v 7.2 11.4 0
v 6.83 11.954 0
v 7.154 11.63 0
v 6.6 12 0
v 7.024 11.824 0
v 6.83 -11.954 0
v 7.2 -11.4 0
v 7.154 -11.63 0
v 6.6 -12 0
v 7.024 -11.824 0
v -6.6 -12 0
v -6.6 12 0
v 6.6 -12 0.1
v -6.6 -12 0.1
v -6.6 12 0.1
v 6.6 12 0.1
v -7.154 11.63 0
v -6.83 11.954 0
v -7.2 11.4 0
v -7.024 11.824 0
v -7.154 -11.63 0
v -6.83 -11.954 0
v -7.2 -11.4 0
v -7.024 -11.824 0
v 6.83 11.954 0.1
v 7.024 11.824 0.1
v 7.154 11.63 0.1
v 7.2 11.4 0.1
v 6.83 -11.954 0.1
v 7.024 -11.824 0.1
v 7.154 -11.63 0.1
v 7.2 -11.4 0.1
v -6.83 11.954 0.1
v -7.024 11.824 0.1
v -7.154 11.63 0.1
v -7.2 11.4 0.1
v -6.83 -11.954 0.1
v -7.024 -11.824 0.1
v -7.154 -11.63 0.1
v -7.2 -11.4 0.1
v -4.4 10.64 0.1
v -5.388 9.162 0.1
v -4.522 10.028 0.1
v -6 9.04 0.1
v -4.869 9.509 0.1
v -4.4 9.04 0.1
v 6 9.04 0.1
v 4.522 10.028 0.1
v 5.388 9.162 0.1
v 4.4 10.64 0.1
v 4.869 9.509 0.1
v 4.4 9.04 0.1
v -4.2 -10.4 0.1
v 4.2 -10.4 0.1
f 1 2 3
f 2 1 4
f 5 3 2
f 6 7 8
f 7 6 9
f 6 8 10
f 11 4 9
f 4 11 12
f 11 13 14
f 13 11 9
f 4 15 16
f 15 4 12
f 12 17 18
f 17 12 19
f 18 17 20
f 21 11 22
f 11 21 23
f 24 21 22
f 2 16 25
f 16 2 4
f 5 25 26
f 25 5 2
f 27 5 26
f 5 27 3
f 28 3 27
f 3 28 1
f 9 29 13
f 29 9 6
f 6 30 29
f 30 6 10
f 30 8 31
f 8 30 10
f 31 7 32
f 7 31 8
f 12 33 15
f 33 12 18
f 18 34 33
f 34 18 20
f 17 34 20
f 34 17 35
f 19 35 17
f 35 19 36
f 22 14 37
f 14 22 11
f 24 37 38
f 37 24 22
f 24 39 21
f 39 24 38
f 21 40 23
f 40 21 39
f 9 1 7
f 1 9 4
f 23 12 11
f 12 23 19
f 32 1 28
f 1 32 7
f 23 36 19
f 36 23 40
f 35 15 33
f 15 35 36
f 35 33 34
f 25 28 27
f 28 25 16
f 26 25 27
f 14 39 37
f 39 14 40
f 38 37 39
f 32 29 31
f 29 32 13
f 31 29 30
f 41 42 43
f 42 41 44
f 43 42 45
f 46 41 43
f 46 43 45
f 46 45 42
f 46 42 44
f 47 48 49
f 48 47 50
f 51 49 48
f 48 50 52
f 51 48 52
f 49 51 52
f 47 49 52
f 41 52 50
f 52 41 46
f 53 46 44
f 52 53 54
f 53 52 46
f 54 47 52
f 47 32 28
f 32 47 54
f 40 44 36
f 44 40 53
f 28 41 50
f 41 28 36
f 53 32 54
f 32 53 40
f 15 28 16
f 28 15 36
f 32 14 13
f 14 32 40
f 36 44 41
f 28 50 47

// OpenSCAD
// file: ../p/box3u12.scad
use <../lib.scad>
function ldraw_lib__box3u12() = [
// 0 Box with 3 Parallel Faces without Any Edges
// 0 Name: box3u12.dat
// 0 Author: J.C. Tchang [tchang]
// 0 !LDRAW_ORG Primitive UPDATE 2014-02
// 0 !LICENSE Licensed under CC BY 4.0 : see CAreadme.txt
// 
// 0 BFC CERTIFY CCW
  [0,"BFC","CERTIFY"],
  [0,"BFC","CCW"],
// 
// 0 !HISTORY 2014-12-23 [PTadmin] Official Update 2014-02
// 
// 
// 4 16 -1 1 1 1 1 1 1 1 -1 -1 1 -1
  [4,16,-1,1,1,1,1,1,1,1,-1,-1,1,-1],
// 4 16 -1 1 1 -1 0 1 1 0 1 1 1 1
  [4,16,-1,1,1,-1,0,1,1,0,1,1,1,1],
// 4 16 1 1 -1 1 0 -1 -1 0 -1 -1 1 -1
  [4,16,1,1,-1,1,0,-1,-1,0,-1,-1,1,-1],
];
module ldraw_lib__box3u12(step=0, col=false, unit=2/5, alt=false, line=0.2, solid=!$preview)
    makepoly(ldraw_lib__box3u12(), step=step, col=col, unit=unit, alt=alt, line=line, solid=solid);
ldraw_lib__box3u12(line=0.2);
// file: ../p/1-4cyli.scad
use <../lib.scad>
function ldraw_lib__1_4cyli() = [
// 0 Cylinder 0.25
// 0 Name: 1-4cyli.dat
// 0 Author: James Jessiman
// 0 !LDRAW_ORG Primitive UPDATE 2012-01
// 0 !LICENSE Licensed under CC BY 4.0 : see CAreadme.txt
// 
// 0 BFC CERTIFY CCW
  [0,"BFC","CERTIFY"],
  [0,"BFC","CCW"],
// 
// 0 !HISTORY 2002-03-23 [sbliss] Added BFC statement.
// 0 !HISTORY 2002-04-25 [PTadmin] Official Update 2002-02
// 0 !HISTORY 2007-06-22 [PTadmin] Header formatted for Contributor Agreement
// 0 !HISTORY 2008-07-01 [PTadmin] Official Update 2008-01
// 0 !HISTORY 2012-02-16 [Philo] Changed to CCW
// 0 !HISTORY 2012-03-30 [PTadmin] Official Update 2012-01
// 
// 
// 4 16 1 1 0 0.9239 1 0.3827 0.9239 0 0.3827 1 0 0
  [4,16,1,1,0,0.9239,1,0.3827,0.9239,0,0.3827,1,0,0],
// 5 24 1 0 0 1 1 0 0.9239 0 0.3827 1 0 -1
  [5,24,1,0,0,1,1,0,0.9239,0,0.3827,1,0,-1],
// 4 16 0.9239 1 0.3827 0.7071 1 0.7071 0.7071 0 0.7071 0.9239 0 0.3827
  [4,16,0.9239,1,0.3827,0.7071,1,0.7071,0.7071,0,0.7071,0.9239,0,0.3827],
// 5 24 0.9239 0 0.3827 0.9239 1 0.3827 0.7071 0 0.7071 1 0 0
  [5,24,0.9239,0,0.3827,0.9239,1,0.3827,0.7071,0,0.7071,1,0,0],
// 4 16 0.7071 1 0.7071 0.3827 1 0.9239 0.3827 0 0.9239 0.7071 0 0.7071
  [4,16,0.7071,1,0.7071,0.3827,1,0.9239,0.3827,0,0.9239,0.7071,0,0.7071],
// 5 24 0.7071 0 0.7071 0.7071 1 0.7071 0.3827 0 0.9239 0.9239 0 0.3827
  [5,24,0.7071,0,0.7071,0.7071,1,0.7071,0.3827,0,0.9239,0.9239,0,0.3827],
// 4 16 0.3827 1 0.9239 0 1 1 0 0 1 0.3827 0 0.9239
  [4,16,0.3827,1,0.9239,0,1,1,0,0,1,0.3827,0,0.9239],
// 5 24 0.3827 0 0.9239 0.3827 1 0.9239 0 0 1 0.7071 0 0.7071
  [5,24,0.3827,0,0.9239,0.3827,1,0.9239,0,0,1,0.7071,0,0.7071],
// 5 24 0 0 1 0 1 1 0.3827 0 0.9239 -1 0 1
  [5,24,0,0,1,0,1,1,0.3827,0,0.9239,-1,0,1],
];
module ldraw_lib__1_4cyli(step=0, col=false, unit=2/5, alt=false, line=0.2, solid=!$preview)
    makepoly(ldraw_lib__1_4cyli(), step=step, col=col, unit=unit, alt=alt, line=line, solid=solid);
ldraw_lib__1_4cyli(line=0.2);
// file: s/stickerback018x030.scad
use <../../lib.scad>
use <../../p/1-4chrd.scad>
use <../../p/1-4cyli.scad>
use <../../p/box3u12.scad>
function ldraw_lib__s__stickerback018x030() = [
// 0 ~Sticker Back  1.8 x  3.0
// 0 Name: s\stickerback018x030.dat
// 0 Author: Massimo Maso [Sirio]
// 0 !LDRAW_ORG Subpart UPDATE 2026-08
// 0 !LICENSE Licensed under CC BY 4.0 : see CAreadme.txt
// 
// 0 BFC CERTIFY CCW
  [0,"BFC","CERTIFY"],
  [0,"BFC","CCW"],
// 
// 0 !HISTORY 2026-08-31 [OrionP] Official Update 2026-08
// 
// 0 // Primitives
// 1 16 -28.5 0 16.5 -1.5 0 0 0 -1 0 0 0 1.5 1-4chrd.dat
  [1,16,-28.5,0,16.5,-1.5,0,0,0,-1,0,0,0,1.5, ldraw_lib__1_4chrd()],
// 1 16 28.5 0 16.5 1.5 0 0 0 -1 0 0 0 1.5 1-4chrd.dat
  [1,16,28.5,0,16.5,1.5,0,0,0,-1,0,0,0,1.5, ldraw_lib__1_4chrd()],
// 1 16 0 -.25 0 0 0 30 0 .25 0 16.5 0 0 box3u12.dat
  [1,16,0,-.25,0,0,0,30,0,.25,0,16.5,0,0, ldraw_lib__box3u12()],
// 1 16 -28.5 0 -16.5 -1.5 0 0 0 -1 0 0 0 -1.5 1-4chrd.dat
  [1,16,-28.5,0,-16.5,-1.5,0,0,0,-1,0,0,0,-1.5, ldraw_lib__1_4chrd()],
// 1 16 28.5 0 -16.5 1.5 0 0 0 -1 0 0 0 -1.5 1-4chrd.dat
  [1,16,28.5,0,-16.5,1.5,0,0,0,-1,0,0,0,-1.5, ldraw_lib__1_4chrd()],
// 1 16 -28.5 0 16.5 -1.5 0 0 0 -.25 0 0 0 1.5 1-4cyli.dat
  [1,16,-28.5,0,16.5,-1.5,0,0,0,-.25,0,0,0,1.5, ldraw_lib__1_4cyli()],
// 1 16 28.5 0 16.5 1.5 0 0 0 -.25 0 0 0 1.5 1-4cyli.dat
  [1,16,28.5,0,16.5,1.5,0,0,0,-.25,0,0,0,1.5, ldraw_lib__1_4cyli()],
// 1 16 -28.5 0 -16.5 -1.5 0 0 0 -.25 0 0 0 -1.5 1-4cyli.dat
  [1,16,-28.5,0,-16.5,-1.5,0,0,0,-.25,0,0,0,-1.5, ldraw_lib__1_4cyli()],
// 1 16 28.5 0 -16.5 1.5 0 0 0 -.25 0 0 0 -1.5 1-4cyli.dat
  [1,16,28.5,0,-16.5,1.5,0,0,0,-.25,0,0,0,-1.5, ldraw_lib__1_4cyli()],
// 0 // Bottom face
// 4 16 -30 0 16.5 -28.5 0 18 28.5 0 18 30 0 16.5
  [4,16,-30,0,16.5,-28.5,0,18,28.5,0,18,30,0,16.5],
// 4 16 -30 0 -16.5 30 0 -16.5 28.5 0 -18 -28.5 0 -18
  [4,16,-30,0,-16.5,30,0,-16.5,28.5,0,-18,-28.5,0,-18],
// 0 // Lateral face
// 4 16 -28.5 0 18 -28.5 -.25 18 28.5 -.25 18 28.5 0 18
  [4,16,-28.5,0,18,-28.5,-.25,18,28.5,-.25,18,28.5,0,18],
// 4 16 -28.5 0 -18 28.5 0 -18 28.5 -.25 -18 -28.5 -.25 -18
  [4,16,-28.5,0,-18,28.5,0,-18,28.5,-.25,-18,-28.5,-.25,-18],
];
module ldraw_lib__s__stickerback018x030(step=0, col=false, unit=2/5, alt=false, line=0.2, solid=!$preview)
    makepoly(ldraw_lib__s__stickerback018x030(), step=step, col=col, unit=unit, alt=alt, line=line, solid=solid);
ldraw_lib__s__stickerback018x030(line=0.2);
// file: ../p/1-4ndis.scad
use <../lib.scad>
function ldraw_lib__1_4ndis() = [
// 0 Disc Negative 0.25
// 0 Name: 1-4ndis.dat
// 0 Author: James Jessiman
// 0 !LDRAW_ORG Primitive UPDATE 2012-01
// 0 !LICENSE Licensed under CC BY 4.0 : see CAreadme.txt
// 
// 0 BFC CERTIFY CCW
  [0,"BFC","CERTIFY"],
  [0,"BFC","CCW"],
// 
// 0 !HISTORY 2002-03-23 [sbliss] Added BFC Statement
// 0 !HISTORY 2002-04-25 [PTadmin] Official Update 2002-02
// 0 !HISTORY 2007-06-22 [PTadmin] Header formatted for Contributor Agreement
// 0 !HISTORY 2008-07-01 [PTadmin] Official Update 2008-01
// 0 !HISTORY 2012-02-16 [Philo] Changed to CCW
// 0 !HISTORY 2012-03-30 [PTadmin] Official Update 2012-01
// 
// 
// 3 16 0.9239 0 0.3827 1 0 0 1 0 1
  [3,16,0.9239,0,0.3827,1,0,0,1,0,1],
// 3 16 0.7071 0 0.7071 0.9239 0 0.3827 1 0 1
  [3,16,0.7071,0,0.7071,0.9239,0,0.3827,1,0,1],
// 3 16 0.3827 0 0.9239 0.7071 0 0.7071 1 0 1
  [3,16,0.3827,0,0.9239,0.7071,0,0.7071,1,0,1],
// 3 16 0 0 1 0.3827 0 0.9239 1 0 1
  [3,16,0,0,1,0.3827,0,0.9239,1,0,1],
];
module ldraw_lib__1_4ndis(step=0, col=false, unit=2/5, alt=false, line=0.2, solid=!$preview)
    makepoly(ldraw_lib__1_4ndis(), step=step, col=col, unit=unit, alt=alt, line=line, solid=solid);
ldraw_lib__1_4ndis(line=0.2);
// file: ../p/1-4chrd.scad
use <../lib.scad>
function ldraw_lib__1_4chrd() = [
// 0 Chord 0.25
// 0 Name: 1-4chrd.dat
// 0 Author: Max Martin Richter [MMR1988]
// 0 !LDRAW_ORG Primitive UPDATE 2023-05
// 0 !LICENSE Licensed under CC BY 4.0 : see CAreadme.txt
// 
// 0 BFC CERTIFY CCW
  [0,"BFC","CERTIFY"],
  [0,"BFC","CCW"],
// 
// 0 !HISTORY 2004-04-22 [PTadmin] Official Update 2004-02
// 0 !HISTORY 2007-10-09 [PTadmin] Header formatted for Contributor Agreement
// 0 !HISTORY 2008-07-01 [PTadmin] Official Update 2008-01
// 0 !HISTORY 2012-08-02 [MMR1988] Re-creation with PrimGen2 and Rectifier
// 0 !HISTORY 2012-08-09 [PTadmin] Official Update 2012-02
// 0 !HISTORY 2023-10-27 [OrionP] Change author to MMR1988 from hafhead
// 0 !HISTORY 2023-10-31 [OrionP] Official Update 2023-05
// 
// 4 16 0.9239 0 0.3827 0.3827 0 0.9239 0 0 1 1 0 0
  [4,16,0.9239,0,0.3827,0.3827,0,0.9239,0,0,1,1,0,0],
// 3 16 0.7071 0 0.7071 0.3827 0 0.9239 0.9239 0 0.3827
  [3,16,0.7071,0,0.7071,0.3827,0,0.9239,0.9239,0,0.3827],
];
module ldraw_lib__1_4chrd(step=0, col=false, unit=2/5, alt=false, line=0.2, solid=!$preview)
    makepoly(ldraw_lib__1_4chrd(), step=step, col=col, unit=unit, alt=alt, line=line, solid=solid);
ldraw_lib__1_4chrd(line=0.2);
// main file
use <../lib.scad>
use <../p/1-4chrd.scad>
use <../p/1-4ndis.scad>
use <s/stickerback018x030.scad>
function ldraw_lib__6058327c() = [
// 0 Sticker  3.0 x  1.8 with Olive Green Trapezoid with Cut Corners on Dark Bluish Grey Background
// 0 Name: 6058327c.dat
// 0 Author: Evert-Jan Boer [ejboer]
// 0 !LDRAW_ORG Part UPDATE 2026-09
// 0 !LICENSE Licensed under CC BY 4.0 : see CAreadme.txt
// 
// 0 BFC CERTIFY CCW
  [0,"BFC","CERTIFY"],
  [0,"BFC","CCW"],
// 
// 0 !CATEGORY Sticker
// 0 !KEYWORDS AT-AP, Bricklink 75043stk01, Brickowl 73486, Rebrickable 16340
// 0 !KEYWORDS set 75043
// 
// 0 !HISTORY 2017-12-30 [PTadmin] Official Update 2017-01
// 0 !HISTORY 2026-04-24 [Sirio] Introduced stickerback, changed description and adapted top face
// 0 !HISTORY 2026-09-30 [OrionP] Official Update 2026-09
// 
// 0 // Stickerback
// 1 16 0 0 0 0 0 1 0 1 0 -1 0 0 s\stickerback018x030.dat
  [1,16,0,0,0,0,0,1,0,1,0,-1,0,0, ldraw_lib__s__stickerback018x030()],
// 0 // Primitives
// 1 72 -16.5 -.25 28.5 -1.5 0 0 0 1 0 0 0 1.5 1-4chrd.dat
  [1,72,-16.5,-.25,28.5,-1.5,0,0,0,1,0,0,0,1.5, ldraw_lib__1_4chrd()],
// 1 72 16.5 -.25 28.5 1.5 0 0 0 1 0 0 0 1.5 1-4chrd.dat
  [1,72,16.5,-.25,28.5,1.5,0,0,0,1,0,0,0,1.5, ldraw_lib__1_4chrd()],
// 1 72 -16.5 -.25 -28.5 -1.5 0 0 0 1 0 0 0 -1.5 1-4chrd.dat
  [1,72,-16.5,-.25,-28.5,-1.5,0,0,0,1,0,0,0,-1.5, ldraw_lib__1_4chrd()],
// 1 72 16.5 -.25 -28.5 1.5 0 0 0 1 0 0 0 -1.5 1-4chrd.dat
  [1,72,16.5,-.25,-28.5,1.5,0,0,0,1,0,0,0,-1.5, ldraw_lib__1_4chrd()],
// 1 72 -15 -.25 26.6 4 0 0 0 1 0 0 0 -4 1-4chrd.dat
  [1,72,-15,-.25,26.6,4,0,0,0,1,0,0,0,-4, ldraw_lib__1_4chrd()],
// 1 330 -15 -.25 26.6 4 0 0 0 1 0 0 0 -4 1-4ndis.dat
  [1,330,-15,-.25,26.6,4,0,0,0,1,0,0,0,-4, ldraw_lib__1_4ndis()],
// 1 72 15 -.25 26.6 -4 0 0 0 1 0 0 0 -4 1-4chrd.dat
  [1,72,15,-.25,26.6,-4,0,0,0,1,0,0,0,-4, ldraw_lib__1_4chrd()],
// 1 330 15 -.25 26.6 -4 0 0 0 1 0 0 0 -4 1-4ndis.dat
  [1,330,15,-.25,26.6,-4,0,0,0,1,0,0,0,-4, ldraw_lib__1_4ndis()],
// 0 // Top face
// 0 // Green faces
// 4 330 -11 -.25 26.6 -11 -.25 22.6 11 -.25 22.6 11 -.25 26.6
  [4,330,-11,-.25,26.6,-11,-.25,22.6,11,-.25,22.6,11,-.25,26.6],
// 3 330 -10.5 -.25 -26 -11 -.25 22.6 -15 -.25 22.6
  [3,330,-10.5,-.25,-26,-11,-.25,22.6,-15,-.25,22.6],
// 4 330 -10.5 -.25 -26 10.5 -.25 -26 11 -.25 22.6 -11 -.25 22.6
  [4,330,-10.5,-.25,-26,10.5,-.25,-26,11,-.25,22.6,-11,-.25,22.6],
// 3 330 10.5 -.25 -26 15 -.25 22.6 11 -.25 22.6
  [3,330,10.5,-.25,-26,15,-.25,22.6,11,-.25,22.6],
// 0 // Grey faces
// 4 72 18 -.25 -28.5 18 -.25 28.5 15 -.25 22.6 10.5 -.25 -26
  [4,72,18,-.25,-28.5,18,-.25,28.5,15,-.25,22.6,10.5,-.25,-26],
// 4 72 -15 -.25 22.6 -18 -.25 28.5 -18 -.25 -28.5 -10.5 -.25 -26
  [4,72,-15,-.25,22.6,-18,-.25,28.5,-18,-.25,-28.5,-10.5,-.25,-26],
// 4 72 11 -.25 26.6 18 -.25 28.5 -18 -.25 28.5 -11 -.25 26.6
  [4,72,11,-.25,26.6,18,-.25,28.5,-18,-.25,28.5,-11,-.25,26.6],
// 4 72 -10.5 -.25 -26 -18 -.25 -28.5 18 -.25 -28.5 10.5 -.25 -26
  [4,72,-10.5,-.25,-26,-18,-.25,-28.5,18,-.25,-28.5,10.5,-.25,-26],
// 4 72 -18 -.25 28.5 18 -.25 28.5 16.5 -.25 30 -16.5 -.25 30
  [4,72,-18,-.25,28.5,18,-.25,28.5,16.5,-.25,30,-16.5,-.25,30],
// 4 72 -18 -.25 -28.5 -16.5 -.25 -30 16.5 -.25 -30 18 -.25 -28.5
  [4,72,-18,-.25,-28.5,-16.5,-.25,-30,16.5,-.25,-30,18,-.25,-28.5],
// 3 72 -18 -.25 28.5 -15 -.25 22.6 -11 -.25 26.6
  [3,72,-18,-.25,28.5,-15,-.25,22.6,-11,-.25,26.6],
// 3 72 18 -.25 28.5 11 -.25 26.6 15 -.25 22.6
  [3,72,18,-.25,28.5,11,-.25,26.6,15,-.25,22.6],
];
module ldraw_lib__6058327c(step=0, col=false, unit=2/5, alt=false, line=0.2, solid=!$preview)
    makepoly(ldraw_lib__6058327c(), step=step, col=col, unit=unit, alt=alt, line=line, solid=solid);
ldraw_lib__6058327c(line=0.2);
